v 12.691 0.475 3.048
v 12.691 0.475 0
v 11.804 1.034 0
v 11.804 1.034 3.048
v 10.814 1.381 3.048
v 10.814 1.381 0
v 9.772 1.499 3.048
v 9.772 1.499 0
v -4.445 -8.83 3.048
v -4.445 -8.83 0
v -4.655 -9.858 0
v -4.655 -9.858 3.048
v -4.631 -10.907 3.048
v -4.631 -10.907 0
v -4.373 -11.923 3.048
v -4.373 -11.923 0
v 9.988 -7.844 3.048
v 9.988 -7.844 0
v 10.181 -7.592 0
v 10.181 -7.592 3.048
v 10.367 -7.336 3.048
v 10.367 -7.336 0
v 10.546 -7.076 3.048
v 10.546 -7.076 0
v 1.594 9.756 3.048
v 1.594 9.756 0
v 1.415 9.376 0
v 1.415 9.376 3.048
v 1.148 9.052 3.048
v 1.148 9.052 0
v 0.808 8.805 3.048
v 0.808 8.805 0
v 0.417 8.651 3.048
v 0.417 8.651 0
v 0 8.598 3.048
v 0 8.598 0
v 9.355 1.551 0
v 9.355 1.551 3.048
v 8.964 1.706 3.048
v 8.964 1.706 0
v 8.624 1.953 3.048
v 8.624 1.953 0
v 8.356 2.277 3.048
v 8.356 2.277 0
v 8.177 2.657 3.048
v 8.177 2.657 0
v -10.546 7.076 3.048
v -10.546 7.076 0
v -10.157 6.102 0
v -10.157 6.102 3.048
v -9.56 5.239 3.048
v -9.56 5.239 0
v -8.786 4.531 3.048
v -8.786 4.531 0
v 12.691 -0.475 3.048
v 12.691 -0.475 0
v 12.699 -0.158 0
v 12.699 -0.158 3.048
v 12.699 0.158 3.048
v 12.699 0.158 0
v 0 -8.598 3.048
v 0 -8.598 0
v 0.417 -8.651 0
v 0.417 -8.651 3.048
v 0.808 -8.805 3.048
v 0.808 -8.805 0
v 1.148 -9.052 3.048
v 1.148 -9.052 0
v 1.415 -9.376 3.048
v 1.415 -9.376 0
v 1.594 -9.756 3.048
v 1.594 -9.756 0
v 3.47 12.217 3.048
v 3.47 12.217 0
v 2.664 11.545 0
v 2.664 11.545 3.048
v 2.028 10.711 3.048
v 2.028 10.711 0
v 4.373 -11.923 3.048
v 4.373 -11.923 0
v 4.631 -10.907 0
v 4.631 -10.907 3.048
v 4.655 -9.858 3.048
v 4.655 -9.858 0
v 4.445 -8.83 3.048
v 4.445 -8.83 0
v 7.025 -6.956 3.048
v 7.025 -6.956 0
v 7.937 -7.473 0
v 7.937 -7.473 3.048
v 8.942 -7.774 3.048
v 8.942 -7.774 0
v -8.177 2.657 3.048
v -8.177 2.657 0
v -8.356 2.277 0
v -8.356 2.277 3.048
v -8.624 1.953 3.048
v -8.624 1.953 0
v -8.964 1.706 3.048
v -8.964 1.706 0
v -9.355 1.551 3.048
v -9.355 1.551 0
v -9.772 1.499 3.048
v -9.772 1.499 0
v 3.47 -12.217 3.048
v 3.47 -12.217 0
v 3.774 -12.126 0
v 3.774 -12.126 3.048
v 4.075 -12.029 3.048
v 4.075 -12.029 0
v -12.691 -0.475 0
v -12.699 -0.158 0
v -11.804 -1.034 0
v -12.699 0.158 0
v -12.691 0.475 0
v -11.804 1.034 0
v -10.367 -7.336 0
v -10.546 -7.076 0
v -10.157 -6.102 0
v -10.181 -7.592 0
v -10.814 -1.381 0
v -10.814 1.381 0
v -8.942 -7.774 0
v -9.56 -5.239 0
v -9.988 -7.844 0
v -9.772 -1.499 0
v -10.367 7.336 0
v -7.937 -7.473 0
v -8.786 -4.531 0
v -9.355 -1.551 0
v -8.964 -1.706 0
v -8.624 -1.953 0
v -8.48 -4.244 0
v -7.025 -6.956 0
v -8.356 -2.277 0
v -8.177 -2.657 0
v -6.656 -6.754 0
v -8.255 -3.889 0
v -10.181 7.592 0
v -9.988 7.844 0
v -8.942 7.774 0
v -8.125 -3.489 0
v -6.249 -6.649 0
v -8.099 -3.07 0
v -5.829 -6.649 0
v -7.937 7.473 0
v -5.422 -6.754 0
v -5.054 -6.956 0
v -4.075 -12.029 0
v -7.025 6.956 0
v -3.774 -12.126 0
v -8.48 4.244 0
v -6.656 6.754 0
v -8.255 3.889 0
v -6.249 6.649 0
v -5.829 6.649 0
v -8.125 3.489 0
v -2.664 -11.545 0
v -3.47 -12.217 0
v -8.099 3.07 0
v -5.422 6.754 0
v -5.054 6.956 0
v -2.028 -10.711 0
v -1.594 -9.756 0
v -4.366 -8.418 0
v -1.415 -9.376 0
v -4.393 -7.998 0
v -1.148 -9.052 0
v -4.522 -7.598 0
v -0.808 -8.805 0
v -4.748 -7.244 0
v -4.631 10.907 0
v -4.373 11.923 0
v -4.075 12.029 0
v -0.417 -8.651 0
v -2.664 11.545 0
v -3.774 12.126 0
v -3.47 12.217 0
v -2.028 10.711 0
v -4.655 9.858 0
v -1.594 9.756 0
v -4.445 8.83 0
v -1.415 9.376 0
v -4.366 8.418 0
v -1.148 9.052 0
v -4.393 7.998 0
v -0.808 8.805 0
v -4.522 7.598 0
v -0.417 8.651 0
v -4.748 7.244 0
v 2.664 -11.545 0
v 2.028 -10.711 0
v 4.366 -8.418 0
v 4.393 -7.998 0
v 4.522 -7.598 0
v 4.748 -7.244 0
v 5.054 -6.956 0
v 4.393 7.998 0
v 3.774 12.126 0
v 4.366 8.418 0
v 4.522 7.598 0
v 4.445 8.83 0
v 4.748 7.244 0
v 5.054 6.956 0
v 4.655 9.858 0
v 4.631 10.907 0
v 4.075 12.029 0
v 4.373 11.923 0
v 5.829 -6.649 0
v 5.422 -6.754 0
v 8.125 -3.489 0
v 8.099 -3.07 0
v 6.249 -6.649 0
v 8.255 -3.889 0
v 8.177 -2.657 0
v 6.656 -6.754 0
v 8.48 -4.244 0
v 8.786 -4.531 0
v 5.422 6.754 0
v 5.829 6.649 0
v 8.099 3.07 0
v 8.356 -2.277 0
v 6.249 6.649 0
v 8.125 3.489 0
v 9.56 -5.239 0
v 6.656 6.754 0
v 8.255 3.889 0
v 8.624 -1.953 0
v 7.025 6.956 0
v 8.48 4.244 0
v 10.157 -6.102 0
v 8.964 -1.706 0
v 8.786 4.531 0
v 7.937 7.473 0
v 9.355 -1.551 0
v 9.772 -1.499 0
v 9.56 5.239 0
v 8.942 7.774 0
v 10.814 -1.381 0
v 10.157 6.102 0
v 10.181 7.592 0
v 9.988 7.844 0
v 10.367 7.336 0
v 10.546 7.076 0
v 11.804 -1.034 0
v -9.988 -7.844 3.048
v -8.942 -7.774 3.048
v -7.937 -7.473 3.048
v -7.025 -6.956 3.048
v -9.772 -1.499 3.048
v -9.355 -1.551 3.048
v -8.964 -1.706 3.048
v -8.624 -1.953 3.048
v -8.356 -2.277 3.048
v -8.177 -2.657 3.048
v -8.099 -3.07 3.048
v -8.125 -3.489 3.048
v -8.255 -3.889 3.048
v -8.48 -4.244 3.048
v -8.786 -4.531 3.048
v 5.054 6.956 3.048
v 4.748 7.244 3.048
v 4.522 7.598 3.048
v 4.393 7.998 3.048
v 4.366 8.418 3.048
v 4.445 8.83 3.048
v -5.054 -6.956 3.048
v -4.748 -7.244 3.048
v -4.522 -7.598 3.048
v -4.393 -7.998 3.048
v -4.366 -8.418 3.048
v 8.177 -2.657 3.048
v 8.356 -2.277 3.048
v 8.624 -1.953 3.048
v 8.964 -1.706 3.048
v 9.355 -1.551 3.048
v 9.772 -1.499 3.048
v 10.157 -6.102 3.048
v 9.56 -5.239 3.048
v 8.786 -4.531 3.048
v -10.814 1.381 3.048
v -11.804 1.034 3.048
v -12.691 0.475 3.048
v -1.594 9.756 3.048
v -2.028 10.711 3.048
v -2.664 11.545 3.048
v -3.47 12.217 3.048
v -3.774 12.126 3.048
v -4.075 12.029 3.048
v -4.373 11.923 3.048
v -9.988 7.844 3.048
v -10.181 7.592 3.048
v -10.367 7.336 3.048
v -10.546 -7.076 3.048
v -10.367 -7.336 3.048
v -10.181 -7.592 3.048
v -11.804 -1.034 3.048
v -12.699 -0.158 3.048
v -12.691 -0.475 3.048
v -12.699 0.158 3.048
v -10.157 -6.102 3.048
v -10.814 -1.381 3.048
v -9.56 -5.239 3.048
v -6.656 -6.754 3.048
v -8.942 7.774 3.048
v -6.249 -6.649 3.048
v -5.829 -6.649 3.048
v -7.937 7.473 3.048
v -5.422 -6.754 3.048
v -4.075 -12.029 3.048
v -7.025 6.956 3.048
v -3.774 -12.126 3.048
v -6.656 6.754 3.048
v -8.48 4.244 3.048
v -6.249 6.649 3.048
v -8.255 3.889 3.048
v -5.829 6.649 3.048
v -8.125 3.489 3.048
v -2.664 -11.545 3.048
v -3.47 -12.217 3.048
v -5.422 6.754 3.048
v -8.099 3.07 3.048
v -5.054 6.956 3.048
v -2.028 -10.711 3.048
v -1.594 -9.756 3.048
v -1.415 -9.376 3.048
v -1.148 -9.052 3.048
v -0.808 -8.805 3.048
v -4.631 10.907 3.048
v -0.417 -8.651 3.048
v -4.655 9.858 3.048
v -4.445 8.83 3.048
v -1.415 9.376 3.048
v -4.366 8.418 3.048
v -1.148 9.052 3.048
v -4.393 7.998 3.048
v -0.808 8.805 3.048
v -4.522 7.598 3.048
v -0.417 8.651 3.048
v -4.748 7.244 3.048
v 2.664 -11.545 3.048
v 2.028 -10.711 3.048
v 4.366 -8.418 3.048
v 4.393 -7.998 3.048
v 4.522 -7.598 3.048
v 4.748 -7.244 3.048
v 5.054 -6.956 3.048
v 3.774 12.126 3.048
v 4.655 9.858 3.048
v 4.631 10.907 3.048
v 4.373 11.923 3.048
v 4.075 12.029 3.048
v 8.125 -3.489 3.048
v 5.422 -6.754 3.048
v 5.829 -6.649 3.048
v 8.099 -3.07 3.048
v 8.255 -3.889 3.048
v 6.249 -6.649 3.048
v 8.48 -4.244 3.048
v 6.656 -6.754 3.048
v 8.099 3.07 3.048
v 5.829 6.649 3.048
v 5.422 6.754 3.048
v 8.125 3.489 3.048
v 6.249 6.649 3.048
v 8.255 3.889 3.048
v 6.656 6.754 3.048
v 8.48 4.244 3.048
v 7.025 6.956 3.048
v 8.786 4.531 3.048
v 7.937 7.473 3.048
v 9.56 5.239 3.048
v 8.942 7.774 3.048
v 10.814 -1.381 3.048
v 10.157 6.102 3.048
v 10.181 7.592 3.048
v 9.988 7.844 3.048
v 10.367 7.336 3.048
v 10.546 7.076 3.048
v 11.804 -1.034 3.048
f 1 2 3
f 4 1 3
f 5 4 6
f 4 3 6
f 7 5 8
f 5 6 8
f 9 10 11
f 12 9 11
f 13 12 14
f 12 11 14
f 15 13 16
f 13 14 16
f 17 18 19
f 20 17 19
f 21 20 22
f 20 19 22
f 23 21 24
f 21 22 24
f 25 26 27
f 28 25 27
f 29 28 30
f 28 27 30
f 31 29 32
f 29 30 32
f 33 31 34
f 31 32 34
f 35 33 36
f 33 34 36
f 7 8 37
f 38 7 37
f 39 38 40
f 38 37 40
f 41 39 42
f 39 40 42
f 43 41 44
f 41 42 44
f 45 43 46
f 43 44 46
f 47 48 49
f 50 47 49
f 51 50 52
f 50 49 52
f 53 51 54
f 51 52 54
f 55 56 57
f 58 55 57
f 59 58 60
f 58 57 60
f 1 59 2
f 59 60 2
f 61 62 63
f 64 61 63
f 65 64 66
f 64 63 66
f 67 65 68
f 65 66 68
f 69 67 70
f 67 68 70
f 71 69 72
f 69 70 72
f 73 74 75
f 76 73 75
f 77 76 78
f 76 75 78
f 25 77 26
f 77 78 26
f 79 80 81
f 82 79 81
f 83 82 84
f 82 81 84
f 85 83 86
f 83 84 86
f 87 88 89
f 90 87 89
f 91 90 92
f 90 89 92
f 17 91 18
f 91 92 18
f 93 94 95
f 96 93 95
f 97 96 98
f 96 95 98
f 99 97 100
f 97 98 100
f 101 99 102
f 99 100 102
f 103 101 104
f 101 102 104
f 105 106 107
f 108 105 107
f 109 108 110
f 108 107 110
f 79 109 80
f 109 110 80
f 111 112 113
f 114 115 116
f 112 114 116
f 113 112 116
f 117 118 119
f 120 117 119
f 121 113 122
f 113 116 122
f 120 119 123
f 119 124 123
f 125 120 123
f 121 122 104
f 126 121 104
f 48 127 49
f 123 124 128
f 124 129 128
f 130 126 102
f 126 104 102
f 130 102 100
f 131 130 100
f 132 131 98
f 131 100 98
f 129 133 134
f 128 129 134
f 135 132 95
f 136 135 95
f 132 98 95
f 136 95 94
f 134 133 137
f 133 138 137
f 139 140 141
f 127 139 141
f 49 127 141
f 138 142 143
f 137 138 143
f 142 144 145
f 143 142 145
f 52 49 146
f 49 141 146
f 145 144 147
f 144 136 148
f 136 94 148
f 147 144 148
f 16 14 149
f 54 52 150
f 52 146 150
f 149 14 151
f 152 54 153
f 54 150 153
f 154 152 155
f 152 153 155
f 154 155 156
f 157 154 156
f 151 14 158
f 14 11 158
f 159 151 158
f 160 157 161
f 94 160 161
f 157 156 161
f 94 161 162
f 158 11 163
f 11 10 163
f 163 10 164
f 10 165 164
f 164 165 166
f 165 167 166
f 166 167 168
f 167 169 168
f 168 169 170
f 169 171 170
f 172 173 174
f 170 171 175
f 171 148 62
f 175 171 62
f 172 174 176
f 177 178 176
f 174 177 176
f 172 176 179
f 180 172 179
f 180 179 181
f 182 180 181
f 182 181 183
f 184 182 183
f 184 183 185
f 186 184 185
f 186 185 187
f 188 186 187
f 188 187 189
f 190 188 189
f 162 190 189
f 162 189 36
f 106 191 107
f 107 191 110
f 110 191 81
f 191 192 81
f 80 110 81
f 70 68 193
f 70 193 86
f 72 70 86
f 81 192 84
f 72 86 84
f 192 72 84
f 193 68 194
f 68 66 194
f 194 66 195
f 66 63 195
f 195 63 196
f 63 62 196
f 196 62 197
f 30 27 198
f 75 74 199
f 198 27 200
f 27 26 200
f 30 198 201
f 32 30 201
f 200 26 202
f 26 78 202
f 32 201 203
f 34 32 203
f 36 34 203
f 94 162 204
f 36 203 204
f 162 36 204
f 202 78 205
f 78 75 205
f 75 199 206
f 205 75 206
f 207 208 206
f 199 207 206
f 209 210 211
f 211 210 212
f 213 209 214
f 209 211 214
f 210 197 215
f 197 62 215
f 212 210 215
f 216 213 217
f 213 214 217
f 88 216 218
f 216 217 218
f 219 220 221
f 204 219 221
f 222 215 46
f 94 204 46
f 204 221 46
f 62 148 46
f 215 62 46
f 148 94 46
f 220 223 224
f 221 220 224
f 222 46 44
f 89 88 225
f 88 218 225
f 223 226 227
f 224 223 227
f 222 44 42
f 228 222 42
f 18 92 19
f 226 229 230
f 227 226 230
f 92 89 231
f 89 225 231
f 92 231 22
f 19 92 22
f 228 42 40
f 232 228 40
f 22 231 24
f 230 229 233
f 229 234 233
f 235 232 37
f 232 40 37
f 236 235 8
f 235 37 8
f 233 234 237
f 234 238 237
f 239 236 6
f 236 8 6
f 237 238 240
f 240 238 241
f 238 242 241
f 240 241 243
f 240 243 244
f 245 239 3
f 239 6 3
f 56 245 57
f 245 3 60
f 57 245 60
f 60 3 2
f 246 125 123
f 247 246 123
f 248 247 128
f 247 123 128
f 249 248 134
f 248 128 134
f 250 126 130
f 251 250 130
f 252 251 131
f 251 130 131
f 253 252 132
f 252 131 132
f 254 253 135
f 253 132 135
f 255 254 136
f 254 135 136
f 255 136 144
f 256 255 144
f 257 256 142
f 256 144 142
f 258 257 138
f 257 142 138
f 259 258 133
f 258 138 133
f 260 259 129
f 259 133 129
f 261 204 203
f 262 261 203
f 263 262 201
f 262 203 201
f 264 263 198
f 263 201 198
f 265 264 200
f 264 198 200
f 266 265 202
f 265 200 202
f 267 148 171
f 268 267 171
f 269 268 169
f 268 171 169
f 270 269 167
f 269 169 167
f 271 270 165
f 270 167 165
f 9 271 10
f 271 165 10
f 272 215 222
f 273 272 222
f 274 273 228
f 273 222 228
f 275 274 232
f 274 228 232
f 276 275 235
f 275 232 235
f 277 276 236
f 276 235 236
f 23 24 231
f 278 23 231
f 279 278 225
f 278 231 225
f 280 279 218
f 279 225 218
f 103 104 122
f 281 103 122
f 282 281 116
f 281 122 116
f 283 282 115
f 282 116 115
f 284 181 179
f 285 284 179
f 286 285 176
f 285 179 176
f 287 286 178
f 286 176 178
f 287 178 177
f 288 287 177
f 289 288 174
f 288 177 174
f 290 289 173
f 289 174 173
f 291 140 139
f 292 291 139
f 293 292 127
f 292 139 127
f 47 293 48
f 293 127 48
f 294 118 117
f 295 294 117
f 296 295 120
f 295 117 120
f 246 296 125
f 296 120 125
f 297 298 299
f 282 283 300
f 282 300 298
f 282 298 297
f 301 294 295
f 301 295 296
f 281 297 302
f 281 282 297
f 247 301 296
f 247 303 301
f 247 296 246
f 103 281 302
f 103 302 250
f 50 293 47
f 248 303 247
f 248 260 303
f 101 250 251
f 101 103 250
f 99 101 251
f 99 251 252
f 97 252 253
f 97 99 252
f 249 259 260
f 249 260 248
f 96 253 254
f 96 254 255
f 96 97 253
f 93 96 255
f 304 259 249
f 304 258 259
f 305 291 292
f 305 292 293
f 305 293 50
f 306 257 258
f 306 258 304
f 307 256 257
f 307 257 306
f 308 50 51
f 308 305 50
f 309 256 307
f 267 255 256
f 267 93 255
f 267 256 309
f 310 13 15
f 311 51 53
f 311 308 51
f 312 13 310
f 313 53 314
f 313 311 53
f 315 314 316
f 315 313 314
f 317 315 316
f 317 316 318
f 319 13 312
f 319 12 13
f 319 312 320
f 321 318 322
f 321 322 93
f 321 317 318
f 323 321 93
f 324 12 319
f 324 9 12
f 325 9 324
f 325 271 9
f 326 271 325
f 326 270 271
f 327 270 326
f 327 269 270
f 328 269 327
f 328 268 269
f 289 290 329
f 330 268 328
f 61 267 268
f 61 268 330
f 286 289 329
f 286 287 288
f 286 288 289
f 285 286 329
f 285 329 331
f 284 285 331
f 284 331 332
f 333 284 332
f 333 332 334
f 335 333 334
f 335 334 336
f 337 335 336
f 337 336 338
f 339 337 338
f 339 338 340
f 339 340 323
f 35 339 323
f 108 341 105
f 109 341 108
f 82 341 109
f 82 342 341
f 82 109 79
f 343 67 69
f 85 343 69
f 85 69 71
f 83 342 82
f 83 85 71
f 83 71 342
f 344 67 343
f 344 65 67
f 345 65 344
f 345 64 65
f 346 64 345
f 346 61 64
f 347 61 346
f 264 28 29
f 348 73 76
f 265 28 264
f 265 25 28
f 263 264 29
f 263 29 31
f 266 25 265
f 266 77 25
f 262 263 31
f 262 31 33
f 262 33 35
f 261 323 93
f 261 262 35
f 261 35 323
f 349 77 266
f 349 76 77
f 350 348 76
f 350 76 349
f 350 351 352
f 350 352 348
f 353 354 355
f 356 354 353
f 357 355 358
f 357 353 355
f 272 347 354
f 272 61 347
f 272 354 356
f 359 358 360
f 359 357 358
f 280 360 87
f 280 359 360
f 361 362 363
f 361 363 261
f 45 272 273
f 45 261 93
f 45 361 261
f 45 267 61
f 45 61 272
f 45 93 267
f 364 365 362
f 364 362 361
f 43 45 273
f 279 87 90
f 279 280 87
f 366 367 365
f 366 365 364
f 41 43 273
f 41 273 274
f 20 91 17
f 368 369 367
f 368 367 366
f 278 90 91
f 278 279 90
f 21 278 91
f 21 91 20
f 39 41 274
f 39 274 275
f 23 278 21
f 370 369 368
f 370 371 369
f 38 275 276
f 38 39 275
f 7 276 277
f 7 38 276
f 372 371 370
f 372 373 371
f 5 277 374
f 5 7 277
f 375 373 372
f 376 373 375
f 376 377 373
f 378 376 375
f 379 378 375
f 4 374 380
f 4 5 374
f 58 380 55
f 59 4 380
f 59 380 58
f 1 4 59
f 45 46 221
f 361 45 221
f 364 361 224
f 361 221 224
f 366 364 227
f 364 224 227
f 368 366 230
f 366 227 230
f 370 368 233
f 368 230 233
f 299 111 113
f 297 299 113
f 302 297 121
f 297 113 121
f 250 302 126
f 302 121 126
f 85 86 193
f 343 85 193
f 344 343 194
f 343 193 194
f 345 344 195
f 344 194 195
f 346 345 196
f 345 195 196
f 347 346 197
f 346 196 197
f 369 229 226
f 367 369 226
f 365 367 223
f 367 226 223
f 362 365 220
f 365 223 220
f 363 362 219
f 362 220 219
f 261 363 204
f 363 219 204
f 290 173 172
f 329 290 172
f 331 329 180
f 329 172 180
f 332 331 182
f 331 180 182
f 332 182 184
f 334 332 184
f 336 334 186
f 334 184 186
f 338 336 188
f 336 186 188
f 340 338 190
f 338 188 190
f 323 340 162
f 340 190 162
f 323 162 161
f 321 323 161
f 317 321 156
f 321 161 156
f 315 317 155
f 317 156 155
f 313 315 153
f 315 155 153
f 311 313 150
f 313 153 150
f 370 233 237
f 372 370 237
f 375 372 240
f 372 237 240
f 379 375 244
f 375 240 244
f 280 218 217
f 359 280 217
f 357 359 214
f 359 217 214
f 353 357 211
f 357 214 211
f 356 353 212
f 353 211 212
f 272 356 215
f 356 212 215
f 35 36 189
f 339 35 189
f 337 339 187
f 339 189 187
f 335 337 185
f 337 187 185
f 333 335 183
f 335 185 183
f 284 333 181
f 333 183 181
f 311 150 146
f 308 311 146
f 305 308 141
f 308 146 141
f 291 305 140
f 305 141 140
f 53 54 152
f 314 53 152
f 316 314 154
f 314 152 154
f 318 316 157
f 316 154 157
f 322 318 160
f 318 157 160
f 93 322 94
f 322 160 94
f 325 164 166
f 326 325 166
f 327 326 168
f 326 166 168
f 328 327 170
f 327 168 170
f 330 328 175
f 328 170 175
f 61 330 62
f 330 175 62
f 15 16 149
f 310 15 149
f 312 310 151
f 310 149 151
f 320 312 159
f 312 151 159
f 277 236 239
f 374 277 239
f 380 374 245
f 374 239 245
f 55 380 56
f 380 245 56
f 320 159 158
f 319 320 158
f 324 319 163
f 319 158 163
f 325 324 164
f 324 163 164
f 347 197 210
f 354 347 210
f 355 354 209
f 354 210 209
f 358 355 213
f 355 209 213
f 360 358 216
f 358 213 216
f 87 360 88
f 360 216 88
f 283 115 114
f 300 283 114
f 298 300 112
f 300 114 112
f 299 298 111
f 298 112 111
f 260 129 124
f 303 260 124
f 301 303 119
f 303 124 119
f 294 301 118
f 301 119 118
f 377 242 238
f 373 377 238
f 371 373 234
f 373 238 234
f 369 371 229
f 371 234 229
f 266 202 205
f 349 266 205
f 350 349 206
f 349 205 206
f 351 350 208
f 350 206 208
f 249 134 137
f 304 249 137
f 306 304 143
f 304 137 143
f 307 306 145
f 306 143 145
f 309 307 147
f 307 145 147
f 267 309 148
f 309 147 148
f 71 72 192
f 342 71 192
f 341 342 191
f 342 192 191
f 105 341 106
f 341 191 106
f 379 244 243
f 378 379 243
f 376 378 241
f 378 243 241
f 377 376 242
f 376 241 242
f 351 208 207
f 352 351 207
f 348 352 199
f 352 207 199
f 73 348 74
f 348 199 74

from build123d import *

# Parameters (mm, degrees)
F1_DEPTH = 3.048
F2_COUNT = 10


with BuildPart() as f1:
    # F0 (on Top) → F1 (new body)
    with BuildSketch(Plane.XY):
        with BuildLine():
            ThreePointArc((0, 8.598116), (-0.985363, 8.91828), (-1.594351, 9.75648))
            ThreePointArc((-1.594351, 9.75648), (-2.322928, 11.1463), (-3.470461, 12.216624))
            ThreePointArc((-3.470461, 12.216624), (-3.924516, 12.078418), (-4.373089, 11.923342))
            ThreePointArc((-4.373089, 11.923342), (-4.672342, 10.382929), (-4.444858, 8.830294))
            ThreePointArc((-4.444858, 8.830294), (-4.444858, 7.794222), (-5.053846, 6.956022))
            Line((-5.053846, 6.956022), (0, 0))
            Line((0, 0), (0, 8.598116))
        make_face()
    extrude(amount=F1_DEPTH)

    # F2: F1 ×10 about axis
    f2_axis = Axis((0, 0, 1.524), (0, 0, 1))


with BuildPart() as f1_1:
    add(f1.part)
    for i in range(1, F2_COUNT):
        add(f1.part.rotate(f2_axis, i * 360 / F2_COUNT))


solid = f1_1.part
